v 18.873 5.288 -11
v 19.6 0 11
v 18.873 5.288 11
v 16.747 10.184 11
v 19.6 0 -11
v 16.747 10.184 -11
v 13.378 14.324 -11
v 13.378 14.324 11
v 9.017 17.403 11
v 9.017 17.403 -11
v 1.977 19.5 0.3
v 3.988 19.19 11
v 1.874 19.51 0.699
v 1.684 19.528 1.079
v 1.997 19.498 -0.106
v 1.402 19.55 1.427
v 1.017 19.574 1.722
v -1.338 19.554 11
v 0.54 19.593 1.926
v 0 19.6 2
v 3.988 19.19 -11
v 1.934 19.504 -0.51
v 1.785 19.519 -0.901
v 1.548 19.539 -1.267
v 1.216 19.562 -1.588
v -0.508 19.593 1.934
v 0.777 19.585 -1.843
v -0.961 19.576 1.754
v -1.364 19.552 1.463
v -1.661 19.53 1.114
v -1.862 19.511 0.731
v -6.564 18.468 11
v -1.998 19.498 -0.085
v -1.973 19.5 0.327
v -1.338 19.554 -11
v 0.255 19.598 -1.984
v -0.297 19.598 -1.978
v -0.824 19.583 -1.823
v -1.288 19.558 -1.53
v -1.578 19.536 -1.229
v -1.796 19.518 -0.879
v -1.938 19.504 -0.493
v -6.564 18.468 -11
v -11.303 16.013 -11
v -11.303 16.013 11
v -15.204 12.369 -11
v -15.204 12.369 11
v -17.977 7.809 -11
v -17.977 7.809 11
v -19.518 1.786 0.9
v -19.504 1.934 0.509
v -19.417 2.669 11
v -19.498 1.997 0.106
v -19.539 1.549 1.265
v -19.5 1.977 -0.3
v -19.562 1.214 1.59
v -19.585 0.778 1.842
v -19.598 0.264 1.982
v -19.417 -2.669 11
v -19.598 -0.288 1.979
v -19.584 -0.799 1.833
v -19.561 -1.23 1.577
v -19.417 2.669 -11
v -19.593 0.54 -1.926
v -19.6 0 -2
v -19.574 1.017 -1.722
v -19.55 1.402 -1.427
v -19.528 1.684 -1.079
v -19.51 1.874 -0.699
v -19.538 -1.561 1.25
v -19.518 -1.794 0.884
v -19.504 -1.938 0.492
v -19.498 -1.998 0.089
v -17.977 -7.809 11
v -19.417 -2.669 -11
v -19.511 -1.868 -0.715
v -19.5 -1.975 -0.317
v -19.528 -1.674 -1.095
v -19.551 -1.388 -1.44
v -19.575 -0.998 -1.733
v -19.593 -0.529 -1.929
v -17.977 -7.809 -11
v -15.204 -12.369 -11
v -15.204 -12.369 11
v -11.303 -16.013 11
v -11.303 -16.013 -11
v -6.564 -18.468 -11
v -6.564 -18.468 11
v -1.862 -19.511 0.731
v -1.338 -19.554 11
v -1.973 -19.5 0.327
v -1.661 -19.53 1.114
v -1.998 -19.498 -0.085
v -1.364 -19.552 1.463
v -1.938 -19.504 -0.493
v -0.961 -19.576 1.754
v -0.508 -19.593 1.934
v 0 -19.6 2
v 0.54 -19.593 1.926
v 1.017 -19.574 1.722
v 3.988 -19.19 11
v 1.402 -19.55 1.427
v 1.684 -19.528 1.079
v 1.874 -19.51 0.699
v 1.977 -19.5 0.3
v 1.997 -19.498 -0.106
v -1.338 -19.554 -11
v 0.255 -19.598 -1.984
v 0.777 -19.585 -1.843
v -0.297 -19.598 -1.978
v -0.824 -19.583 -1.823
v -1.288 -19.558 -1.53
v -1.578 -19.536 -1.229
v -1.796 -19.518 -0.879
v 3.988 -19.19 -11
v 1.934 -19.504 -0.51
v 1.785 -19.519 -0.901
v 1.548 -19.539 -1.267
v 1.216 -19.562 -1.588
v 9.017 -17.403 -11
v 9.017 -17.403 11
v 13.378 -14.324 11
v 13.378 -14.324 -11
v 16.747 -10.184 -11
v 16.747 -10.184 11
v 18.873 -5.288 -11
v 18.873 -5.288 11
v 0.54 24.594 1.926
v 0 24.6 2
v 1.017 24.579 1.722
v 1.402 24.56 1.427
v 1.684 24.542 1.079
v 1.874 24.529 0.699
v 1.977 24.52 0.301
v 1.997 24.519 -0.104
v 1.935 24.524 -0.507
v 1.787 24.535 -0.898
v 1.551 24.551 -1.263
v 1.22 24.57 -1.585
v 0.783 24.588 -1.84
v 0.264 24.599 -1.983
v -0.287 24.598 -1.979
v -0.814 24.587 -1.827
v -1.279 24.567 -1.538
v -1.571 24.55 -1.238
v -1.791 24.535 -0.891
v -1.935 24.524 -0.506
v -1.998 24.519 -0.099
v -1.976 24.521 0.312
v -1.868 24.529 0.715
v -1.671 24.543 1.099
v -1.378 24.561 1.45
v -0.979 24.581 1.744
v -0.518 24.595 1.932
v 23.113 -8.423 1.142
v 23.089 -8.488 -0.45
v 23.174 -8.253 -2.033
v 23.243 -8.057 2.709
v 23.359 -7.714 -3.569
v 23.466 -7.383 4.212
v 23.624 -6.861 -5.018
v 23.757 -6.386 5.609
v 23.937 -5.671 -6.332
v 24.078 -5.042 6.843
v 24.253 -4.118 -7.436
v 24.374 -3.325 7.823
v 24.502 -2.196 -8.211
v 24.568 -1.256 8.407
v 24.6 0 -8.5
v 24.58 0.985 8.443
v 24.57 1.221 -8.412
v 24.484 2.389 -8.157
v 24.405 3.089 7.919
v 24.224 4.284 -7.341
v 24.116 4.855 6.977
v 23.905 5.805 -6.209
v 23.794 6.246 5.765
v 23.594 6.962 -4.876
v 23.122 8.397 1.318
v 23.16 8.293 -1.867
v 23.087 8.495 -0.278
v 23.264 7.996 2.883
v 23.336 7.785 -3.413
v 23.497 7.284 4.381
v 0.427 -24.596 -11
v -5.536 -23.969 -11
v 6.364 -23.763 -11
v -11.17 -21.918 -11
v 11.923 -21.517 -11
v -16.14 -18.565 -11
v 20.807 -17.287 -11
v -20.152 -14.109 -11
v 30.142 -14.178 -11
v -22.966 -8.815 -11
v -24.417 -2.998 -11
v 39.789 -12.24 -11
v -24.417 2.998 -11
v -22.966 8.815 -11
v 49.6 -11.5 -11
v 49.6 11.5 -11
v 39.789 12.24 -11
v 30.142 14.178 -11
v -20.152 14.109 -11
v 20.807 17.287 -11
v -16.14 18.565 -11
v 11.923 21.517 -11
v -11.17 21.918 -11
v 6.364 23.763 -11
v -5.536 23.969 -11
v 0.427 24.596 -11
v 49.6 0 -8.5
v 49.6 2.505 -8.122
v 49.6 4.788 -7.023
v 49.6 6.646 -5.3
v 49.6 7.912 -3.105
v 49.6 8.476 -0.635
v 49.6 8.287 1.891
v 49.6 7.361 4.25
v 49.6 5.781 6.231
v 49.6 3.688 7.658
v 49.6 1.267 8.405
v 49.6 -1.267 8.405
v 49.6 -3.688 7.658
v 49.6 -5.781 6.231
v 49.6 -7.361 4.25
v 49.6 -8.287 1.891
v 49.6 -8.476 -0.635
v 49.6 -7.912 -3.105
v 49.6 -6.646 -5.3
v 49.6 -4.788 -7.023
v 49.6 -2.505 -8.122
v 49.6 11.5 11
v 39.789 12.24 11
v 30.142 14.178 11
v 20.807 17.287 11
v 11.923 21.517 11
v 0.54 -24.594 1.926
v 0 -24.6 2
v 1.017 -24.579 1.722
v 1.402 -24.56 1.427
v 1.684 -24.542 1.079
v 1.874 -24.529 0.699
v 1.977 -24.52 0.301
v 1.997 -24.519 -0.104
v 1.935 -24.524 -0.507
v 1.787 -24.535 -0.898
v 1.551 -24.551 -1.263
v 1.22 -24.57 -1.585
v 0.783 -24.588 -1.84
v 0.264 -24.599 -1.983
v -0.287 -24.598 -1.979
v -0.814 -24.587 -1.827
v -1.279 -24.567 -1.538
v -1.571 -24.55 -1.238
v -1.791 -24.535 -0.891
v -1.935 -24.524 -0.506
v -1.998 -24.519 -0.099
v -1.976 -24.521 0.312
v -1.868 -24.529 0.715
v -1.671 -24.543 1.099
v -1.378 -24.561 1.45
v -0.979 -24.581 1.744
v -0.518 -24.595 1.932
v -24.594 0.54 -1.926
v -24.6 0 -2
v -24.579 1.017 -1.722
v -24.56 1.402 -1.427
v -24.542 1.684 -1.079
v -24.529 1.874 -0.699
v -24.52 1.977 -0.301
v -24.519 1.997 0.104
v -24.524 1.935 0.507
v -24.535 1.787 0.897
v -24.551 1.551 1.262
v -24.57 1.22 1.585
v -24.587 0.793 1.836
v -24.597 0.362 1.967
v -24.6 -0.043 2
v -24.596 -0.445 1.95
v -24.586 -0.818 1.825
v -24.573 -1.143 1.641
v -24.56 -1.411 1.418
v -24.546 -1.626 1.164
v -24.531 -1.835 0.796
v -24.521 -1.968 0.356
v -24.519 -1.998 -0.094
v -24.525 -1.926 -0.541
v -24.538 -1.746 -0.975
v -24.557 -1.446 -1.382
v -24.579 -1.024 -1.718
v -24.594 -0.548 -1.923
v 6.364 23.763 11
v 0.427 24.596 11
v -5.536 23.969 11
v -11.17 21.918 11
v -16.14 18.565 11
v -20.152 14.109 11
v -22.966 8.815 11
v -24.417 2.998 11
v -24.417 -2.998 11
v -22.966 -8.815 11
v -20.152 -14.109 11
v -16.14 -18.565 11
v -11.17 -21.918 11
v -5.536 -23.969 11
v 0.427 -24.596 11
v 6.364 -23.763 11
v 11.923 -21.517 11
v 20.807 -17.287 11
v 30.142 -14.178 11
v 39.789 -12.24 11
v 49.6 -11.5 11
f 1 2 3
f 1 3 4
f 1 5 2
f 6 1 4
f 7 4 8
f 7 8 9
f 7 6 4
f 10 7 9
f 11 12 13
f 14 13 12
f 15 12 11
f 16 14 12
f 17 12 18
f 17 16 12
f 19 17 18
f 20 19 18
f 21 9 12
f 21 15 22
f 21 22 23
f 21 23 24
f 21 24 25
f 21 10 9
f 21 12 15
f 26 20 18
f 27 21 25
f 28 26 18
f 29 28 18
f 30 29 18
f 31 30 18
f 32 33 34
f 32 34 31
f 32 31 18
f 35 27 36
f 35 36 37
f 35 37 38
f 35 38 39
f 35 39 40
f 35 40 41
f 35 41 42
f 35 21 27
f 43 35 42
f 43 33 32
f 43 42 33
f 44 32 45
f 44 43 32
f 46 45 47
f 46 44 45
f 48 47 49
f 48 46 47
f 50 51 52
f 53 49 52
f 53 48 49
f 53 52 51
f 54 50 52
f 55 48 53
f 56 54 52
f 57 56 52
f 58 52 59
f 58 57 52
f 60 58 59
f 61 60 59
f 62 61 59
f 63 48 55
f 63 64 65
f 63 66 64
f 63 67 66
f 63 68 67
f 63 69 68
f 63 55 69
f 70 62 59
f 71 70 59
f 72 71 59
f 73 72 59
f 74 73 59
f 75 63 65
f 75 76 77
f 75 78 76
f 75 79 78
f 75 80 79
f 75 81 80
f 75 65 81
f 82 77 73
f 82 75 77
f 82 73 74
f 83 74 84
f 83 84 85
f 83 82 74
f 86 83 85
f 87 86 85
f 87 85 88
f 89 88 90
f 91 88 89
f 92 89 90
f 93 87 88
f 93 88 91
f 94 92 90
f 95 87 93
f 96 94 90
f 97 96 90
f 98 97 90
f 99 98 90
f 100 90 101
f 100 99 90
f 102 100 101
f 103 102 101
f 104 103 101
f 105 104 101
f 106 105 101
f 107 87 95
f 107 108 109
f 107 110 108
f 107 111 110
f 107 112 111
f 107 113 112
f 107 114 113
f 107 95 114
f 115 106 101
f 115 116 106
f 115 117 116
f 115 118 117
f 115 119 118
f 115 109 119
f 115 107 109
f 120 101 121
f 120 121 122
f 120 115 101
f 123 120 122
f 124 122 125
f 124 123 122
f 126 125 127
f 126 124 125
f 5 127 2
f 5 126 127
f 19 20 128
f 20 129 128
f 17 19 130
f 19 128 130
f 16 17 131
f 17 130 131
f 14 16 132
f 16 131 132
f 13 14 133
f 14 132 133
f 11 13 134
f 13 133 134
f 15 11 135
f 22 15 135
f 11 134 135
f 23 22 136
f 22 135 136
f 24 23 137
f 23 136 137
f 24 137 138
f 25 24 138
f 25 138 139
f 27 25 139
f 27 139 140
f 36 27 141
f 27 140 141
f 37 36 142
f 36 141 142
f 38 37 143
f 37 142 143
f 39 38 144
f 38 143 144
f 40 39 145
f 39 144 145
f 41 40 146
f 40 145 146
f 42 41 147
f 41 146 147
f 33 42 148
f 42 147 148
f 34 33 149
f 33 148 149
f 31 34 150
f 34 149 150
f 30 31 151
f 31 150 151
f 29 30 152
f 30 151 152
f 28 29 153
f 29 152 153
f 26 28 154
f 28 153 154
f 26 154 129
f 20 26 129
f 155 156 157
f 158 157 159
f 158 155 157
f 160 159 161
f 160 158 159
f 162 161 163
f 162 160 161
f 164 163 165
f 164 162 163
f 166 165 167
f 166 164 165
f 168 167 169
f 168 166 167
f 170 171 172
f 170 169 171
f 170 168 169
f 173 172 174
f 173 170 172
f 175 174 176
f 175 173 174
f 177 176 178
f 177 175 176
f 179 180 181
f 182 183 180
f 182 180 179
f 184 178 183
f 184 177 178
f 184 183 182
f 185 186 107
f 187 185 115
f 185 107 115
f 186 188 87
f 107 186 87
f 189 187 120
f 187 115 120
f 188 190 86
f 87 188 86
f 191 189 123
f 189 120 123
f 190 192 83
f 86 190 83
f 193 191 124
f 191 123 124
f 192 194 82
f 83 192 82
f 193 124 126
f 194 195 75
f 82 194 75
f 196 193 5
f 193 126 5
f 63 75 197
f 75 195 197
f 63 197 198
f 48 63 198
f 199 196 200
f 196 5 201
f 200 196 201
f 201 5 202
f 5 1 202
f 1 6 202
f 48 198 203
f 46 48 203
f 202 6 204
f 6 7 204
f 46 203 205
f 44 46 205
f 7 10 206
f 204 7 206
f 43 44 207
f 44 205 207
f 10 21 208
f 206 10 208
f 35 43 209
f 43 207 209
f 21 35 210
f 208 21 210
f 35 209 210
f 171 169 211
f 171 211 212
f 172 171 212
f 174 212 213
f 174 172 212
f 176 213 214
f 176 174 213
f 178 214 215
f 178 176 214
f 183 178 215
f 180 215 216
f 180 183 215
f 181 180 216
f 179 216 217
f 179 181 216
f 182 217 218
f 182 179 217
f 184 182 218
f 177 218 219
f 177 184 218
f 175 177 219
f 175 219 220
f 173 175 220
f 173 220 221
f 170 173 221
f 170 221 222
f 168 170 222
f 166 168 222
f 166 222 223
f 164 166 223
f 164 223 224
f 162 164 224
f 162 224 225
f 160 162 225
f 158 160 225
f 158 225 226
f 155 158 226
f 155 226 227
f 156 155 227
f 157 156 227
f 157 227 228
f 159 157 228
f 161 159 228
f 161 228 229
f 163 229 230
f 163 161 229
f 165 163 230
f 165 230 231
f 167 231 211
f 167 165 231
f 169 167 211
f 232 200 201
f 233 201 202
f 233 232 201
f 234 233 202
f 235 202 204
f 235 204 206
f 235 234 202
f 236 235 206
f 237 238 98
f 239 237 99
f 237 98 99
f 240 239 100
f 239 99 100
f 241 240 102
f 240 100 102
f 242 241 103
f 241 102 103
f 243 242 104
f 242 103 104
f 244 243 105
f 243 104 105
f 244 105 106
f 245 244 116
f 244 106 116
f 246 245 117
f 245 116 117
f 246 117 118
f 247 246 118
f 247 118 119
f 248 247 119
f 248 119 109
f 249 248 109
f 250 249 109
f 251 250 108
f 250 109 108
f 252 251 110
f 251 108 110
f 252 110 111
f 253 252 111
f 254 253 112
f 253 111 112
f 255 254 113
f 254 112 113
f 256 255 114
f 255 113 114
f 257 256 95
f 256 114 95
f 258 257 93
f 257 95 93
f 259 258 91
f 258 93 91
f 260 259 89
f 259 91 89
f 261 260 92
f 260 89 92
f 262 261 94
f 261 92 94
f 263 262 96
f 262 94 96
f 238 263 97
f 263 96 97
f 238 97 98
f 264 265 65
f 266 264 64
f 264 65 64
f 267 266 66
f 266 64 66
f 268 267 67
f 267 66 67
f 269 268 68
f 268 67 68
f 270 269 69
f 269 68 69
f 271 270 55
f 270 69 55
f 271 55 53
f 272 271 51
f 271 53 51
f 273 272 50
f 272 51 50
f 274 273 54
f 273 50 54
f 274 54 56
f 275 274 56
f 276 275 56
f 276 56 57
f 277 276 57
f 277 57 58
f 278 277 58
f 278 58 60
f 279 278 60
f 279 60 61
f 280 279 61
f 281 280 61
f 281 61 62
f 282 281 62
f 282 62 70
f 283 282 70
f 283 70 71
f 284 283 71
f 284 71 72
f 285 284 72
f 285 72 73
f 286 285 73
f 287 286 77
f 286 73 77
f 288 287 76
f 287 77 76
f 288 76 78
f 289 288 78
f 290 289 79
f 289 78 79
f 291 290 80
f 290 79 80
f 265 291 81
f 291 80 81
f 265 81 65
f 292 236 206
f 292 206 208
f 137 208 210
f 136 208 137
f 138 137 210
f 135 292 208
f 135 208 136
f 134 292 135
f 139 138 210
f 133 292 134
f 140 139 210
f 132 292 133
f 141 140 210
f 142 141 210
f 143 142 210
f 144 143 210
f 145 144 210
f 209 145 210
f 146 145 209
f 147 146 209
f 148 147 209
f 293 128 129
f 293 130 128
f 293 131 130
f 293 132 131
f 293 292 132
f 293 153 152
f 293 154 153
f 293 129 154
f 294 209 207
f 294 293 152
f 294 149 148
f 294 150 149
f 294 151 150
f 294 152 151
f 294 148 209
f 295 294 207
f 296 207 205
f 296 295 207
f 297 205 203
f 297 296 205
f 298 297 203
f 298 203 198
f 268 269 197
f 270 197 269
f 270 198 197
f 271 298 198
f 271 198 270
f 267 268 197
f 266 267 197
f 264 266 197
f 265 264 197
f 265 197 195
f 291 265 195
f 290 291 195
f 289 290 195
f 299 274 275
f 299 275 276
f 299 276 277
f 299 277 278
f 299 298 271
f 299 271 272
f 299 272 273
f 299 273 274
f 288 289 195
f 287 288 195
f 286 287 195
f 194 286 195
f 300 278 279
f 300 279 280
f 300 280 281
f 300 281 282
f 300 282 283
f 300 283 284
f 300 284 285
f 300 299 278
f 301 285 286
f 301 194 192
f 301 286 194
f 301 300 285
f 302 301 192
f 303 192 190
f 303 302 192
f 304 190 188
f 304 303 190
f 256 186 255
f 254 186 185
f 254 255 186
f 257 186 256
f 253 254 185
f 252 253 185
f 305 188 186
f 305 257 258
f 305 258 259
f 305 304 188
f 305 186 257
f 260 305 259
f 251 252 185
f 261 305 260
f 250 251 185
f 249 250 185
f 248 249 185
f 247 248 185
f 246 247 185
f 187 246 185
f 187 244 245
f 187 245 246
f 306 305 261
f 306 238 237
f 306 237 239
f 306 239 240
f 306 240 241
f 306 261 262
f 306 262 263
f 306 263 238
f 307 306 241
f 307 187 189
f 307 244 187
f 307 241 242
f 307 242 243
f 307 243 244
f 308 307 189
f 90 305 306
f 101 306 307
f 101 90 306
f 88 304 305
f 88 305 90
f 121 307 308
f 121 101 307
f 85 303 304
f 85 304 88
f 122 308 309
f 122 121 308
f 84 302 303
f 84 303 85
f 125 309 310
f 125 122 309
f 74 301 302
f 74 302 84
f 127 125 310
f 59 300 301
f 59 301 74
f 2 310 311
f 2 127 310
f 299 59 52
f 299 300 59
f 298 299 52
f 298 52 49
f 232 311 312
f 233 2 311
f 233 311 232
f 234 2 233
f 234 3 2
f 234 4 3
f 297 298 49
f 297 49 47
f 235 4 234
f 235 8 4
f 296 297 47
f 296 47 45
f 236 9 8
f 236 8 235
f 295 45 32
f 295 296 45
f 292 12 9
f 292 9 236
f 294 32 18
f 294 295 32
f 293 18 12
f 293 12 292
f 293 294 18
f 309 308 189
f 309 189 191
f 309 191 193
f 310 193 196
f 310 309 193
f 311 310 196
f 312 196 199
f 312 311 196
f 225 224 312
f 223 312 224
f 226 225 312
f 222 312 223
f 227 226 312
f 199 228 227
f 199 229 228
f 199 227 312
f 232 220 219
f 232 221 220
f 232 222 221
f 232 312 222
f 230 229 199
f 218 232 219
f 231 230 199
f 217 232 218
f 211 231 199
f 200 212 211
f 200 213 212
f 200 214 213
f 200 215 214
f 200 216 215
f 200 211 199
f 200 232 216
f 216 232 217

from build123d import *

# Parameters (mm, degrees)
CROQUIS1_R                               = 24.6
CROQUIS1_R_2                             = 19.6
SALIENTE_EXTRUIR1_DEPTH                  = 11
CROQUIS2_W                               = 22
CROQUIS2_H                               = 23
CROQUIS2_R                               = 8.5
SALIENTE_EXTRUIR2_DEPTH                  = 25
SALIENTE_EXTRUIR2_DIRECTION_2_REACH      = 58.096
SALIENTE_EXTRUIR2_DIRECTION_2_END_RADIUS = 24.6
CROQUIS3_R                               = 2
CORTAR_EXTRUIR1_DEPTH                    = 47.5
CROQUIS4_R                               = 2
CORTAR_EXTRUIR2_DEPTH                    = 95
REDONDEO1_R                              = 80


with BuildPart() as part:
    # Croquis1 → Saliente-Extruir1 (new, symmetric)
    with BuildSketch(Plane.XY):
        Circle(CROQUIS1_R)
        Circle(CROQUIS1_R_2, mode=Mode.SUBTRACT)
    extrude(amount=SALIENTE_EXTRUIR1_DEPTH, both=True)

    # Croquis2 → Saliente-Extruir2 (add)
    with BuildSketch(Plane(origin=(24.6, 0, 0), x_dir=(0, 0, -1), z_dir=(1, 0, 0))):
        Rectangle(CROQUIS2_W, CROQUIS2_H)
        Circle(CROQUIS2_R, mode=Mode.SUBTRACT)
    extrude(amount=SALIENTE_EXTRUIR2_DEPTH)

    # Saliente-Extruir2 direction 2: up to this cylinder (the profile starts outside it)
    saliente_extruir2_direction_2_end = Plane(origin=(0, 0, 0), z_dir=(0, 0, -1)) * Cylinder(SALIENTE_EXTRUIR2_DIRECTION_2_END_RADIUS, 166.392, mode=Mode.PRIVATE)
    # Croquis2 → Saliente-Extruir2 direction 2 (add, up to the surface)
    with BuildSketch(Plane(origin=(24.6, 0, 0), x_dir=(0, 0, -1), z_dir=(1, 0, 0)), mode=Mode.PRIVATE) as saliente_extruir2_direction_2_sk1:
        Rectangle(CROQUIS2_W, CROQUIS2_H)
        Circle(CROQUIS2_R, mode=Mode.SUBTRACT)
    saliente_extruir2_direction_2_tool1 = extrude(saliente_extruir2_direction_2_sk1.sketch, amount=-SALIENTE_EXTRUIR2_DIRECTION_2_REACH, mode=Mode.PRIVATE) - saliente_extruir2_direction_2_end
    add(saliente_extruir2_direction_2_tool1.solids().sort_by_distance((24.6, -11.181723, 0))[0])
    add(saliente_extruir2_direction_2_tool1.solids().sort_by_distance((24.6, -11.181723, 0))[1])

    # Croquis3 → Cortar-Extruir1 (cut, symmetric)
    with BuildSketch(Plane(origin=(0, 0, 0), x_dir=(1, 0, 0), z_dir=(0, 1, 0))):
        with Locations(Location((0, 0, 0), (0, 0, 270))):
            Circle(CROQUIS3_R)
    extrude(amount=CORTAR_EXTRUIR1_DEPTH, both=True, mode=Mode.SUBTRACT)

    # Croquis4 → Cortar-Extruir2 (cut)
    with BuildSketch(Plane(origin=(0, 0, 0), x_dir=(0, 0, -1), z_dir=(1, 0, 0))):
        Circle(CROQUIS4_R)
    extrude(amount=-CORTAR_EXTRUIR2_DEPTH, mode=Mode.SUBTRACT)

    # Redondeo1
    # the kernel refuses this fillet: 80 mm, written as the material it adds along each edge
    with BuildSketch(Plane(origin=(21.74649397, 11.5, 11), x_dir=(-0.7001557683573276, 0.713990126007328, 0), z_dir=(0, 0, -1))) as redondeo1_piece_1:
        with BuildLine():
            CenterArc((36.84325364, 76.678287175), REDONDEO1_R, 225.225924333, 28.205393766)
            Line((-19.501792916, 19.88712828), (-20.628693847, 18.751305102))
            ThreePointArc((-20.628693847, 18.751305102), (-10.893280659, 8.823314911), (-1.142384202, -1.120249229))
            Line((-1.142384202, -1.120249229), (0.456263203, -1.533565743))
            ThreePointArc((0.456263203, -1.533565743), (7.015046746, -0.578573306), (13.573830289, -1.533565743))
            Line((13.573830289, -1.533565743), (14.030093492, 0))
        make_face()
    extrude(amount=22)
    with BuildSketch(Plane(origin=(21.74649397, -11.5, 11), x_dir=(-0.7001557683573284, -0.7139901260073274, 0), z_dir=(0, 0, -1))) as redondeo1_piece_2:
        with BuildLine():
            CenterArc((36.84325364, -76.678287175), REDONDEO1_R, 106.568681901, 28.205393766)
            Line((-19.501792916, -19.88712828), (-20.628693847, -18.751305102))
            ThreePointArc((-20.628693847, -18.751305102), (-10.893280659, -8.823314911), (-1.142384202, 1.120249229))
            Line((-1.142384202, 1.120249229), (0.456263203, 1.533565743))
            ThreePointArc((0.456263203, 1.533565743), (7.015046746, 0.578573306), (13.573830289, 1.533565743))
            Line((13.573830289, 1.533565743), (14.030093492, 0))
        make_face()
    extrude(amount=22)


solid = part.part
